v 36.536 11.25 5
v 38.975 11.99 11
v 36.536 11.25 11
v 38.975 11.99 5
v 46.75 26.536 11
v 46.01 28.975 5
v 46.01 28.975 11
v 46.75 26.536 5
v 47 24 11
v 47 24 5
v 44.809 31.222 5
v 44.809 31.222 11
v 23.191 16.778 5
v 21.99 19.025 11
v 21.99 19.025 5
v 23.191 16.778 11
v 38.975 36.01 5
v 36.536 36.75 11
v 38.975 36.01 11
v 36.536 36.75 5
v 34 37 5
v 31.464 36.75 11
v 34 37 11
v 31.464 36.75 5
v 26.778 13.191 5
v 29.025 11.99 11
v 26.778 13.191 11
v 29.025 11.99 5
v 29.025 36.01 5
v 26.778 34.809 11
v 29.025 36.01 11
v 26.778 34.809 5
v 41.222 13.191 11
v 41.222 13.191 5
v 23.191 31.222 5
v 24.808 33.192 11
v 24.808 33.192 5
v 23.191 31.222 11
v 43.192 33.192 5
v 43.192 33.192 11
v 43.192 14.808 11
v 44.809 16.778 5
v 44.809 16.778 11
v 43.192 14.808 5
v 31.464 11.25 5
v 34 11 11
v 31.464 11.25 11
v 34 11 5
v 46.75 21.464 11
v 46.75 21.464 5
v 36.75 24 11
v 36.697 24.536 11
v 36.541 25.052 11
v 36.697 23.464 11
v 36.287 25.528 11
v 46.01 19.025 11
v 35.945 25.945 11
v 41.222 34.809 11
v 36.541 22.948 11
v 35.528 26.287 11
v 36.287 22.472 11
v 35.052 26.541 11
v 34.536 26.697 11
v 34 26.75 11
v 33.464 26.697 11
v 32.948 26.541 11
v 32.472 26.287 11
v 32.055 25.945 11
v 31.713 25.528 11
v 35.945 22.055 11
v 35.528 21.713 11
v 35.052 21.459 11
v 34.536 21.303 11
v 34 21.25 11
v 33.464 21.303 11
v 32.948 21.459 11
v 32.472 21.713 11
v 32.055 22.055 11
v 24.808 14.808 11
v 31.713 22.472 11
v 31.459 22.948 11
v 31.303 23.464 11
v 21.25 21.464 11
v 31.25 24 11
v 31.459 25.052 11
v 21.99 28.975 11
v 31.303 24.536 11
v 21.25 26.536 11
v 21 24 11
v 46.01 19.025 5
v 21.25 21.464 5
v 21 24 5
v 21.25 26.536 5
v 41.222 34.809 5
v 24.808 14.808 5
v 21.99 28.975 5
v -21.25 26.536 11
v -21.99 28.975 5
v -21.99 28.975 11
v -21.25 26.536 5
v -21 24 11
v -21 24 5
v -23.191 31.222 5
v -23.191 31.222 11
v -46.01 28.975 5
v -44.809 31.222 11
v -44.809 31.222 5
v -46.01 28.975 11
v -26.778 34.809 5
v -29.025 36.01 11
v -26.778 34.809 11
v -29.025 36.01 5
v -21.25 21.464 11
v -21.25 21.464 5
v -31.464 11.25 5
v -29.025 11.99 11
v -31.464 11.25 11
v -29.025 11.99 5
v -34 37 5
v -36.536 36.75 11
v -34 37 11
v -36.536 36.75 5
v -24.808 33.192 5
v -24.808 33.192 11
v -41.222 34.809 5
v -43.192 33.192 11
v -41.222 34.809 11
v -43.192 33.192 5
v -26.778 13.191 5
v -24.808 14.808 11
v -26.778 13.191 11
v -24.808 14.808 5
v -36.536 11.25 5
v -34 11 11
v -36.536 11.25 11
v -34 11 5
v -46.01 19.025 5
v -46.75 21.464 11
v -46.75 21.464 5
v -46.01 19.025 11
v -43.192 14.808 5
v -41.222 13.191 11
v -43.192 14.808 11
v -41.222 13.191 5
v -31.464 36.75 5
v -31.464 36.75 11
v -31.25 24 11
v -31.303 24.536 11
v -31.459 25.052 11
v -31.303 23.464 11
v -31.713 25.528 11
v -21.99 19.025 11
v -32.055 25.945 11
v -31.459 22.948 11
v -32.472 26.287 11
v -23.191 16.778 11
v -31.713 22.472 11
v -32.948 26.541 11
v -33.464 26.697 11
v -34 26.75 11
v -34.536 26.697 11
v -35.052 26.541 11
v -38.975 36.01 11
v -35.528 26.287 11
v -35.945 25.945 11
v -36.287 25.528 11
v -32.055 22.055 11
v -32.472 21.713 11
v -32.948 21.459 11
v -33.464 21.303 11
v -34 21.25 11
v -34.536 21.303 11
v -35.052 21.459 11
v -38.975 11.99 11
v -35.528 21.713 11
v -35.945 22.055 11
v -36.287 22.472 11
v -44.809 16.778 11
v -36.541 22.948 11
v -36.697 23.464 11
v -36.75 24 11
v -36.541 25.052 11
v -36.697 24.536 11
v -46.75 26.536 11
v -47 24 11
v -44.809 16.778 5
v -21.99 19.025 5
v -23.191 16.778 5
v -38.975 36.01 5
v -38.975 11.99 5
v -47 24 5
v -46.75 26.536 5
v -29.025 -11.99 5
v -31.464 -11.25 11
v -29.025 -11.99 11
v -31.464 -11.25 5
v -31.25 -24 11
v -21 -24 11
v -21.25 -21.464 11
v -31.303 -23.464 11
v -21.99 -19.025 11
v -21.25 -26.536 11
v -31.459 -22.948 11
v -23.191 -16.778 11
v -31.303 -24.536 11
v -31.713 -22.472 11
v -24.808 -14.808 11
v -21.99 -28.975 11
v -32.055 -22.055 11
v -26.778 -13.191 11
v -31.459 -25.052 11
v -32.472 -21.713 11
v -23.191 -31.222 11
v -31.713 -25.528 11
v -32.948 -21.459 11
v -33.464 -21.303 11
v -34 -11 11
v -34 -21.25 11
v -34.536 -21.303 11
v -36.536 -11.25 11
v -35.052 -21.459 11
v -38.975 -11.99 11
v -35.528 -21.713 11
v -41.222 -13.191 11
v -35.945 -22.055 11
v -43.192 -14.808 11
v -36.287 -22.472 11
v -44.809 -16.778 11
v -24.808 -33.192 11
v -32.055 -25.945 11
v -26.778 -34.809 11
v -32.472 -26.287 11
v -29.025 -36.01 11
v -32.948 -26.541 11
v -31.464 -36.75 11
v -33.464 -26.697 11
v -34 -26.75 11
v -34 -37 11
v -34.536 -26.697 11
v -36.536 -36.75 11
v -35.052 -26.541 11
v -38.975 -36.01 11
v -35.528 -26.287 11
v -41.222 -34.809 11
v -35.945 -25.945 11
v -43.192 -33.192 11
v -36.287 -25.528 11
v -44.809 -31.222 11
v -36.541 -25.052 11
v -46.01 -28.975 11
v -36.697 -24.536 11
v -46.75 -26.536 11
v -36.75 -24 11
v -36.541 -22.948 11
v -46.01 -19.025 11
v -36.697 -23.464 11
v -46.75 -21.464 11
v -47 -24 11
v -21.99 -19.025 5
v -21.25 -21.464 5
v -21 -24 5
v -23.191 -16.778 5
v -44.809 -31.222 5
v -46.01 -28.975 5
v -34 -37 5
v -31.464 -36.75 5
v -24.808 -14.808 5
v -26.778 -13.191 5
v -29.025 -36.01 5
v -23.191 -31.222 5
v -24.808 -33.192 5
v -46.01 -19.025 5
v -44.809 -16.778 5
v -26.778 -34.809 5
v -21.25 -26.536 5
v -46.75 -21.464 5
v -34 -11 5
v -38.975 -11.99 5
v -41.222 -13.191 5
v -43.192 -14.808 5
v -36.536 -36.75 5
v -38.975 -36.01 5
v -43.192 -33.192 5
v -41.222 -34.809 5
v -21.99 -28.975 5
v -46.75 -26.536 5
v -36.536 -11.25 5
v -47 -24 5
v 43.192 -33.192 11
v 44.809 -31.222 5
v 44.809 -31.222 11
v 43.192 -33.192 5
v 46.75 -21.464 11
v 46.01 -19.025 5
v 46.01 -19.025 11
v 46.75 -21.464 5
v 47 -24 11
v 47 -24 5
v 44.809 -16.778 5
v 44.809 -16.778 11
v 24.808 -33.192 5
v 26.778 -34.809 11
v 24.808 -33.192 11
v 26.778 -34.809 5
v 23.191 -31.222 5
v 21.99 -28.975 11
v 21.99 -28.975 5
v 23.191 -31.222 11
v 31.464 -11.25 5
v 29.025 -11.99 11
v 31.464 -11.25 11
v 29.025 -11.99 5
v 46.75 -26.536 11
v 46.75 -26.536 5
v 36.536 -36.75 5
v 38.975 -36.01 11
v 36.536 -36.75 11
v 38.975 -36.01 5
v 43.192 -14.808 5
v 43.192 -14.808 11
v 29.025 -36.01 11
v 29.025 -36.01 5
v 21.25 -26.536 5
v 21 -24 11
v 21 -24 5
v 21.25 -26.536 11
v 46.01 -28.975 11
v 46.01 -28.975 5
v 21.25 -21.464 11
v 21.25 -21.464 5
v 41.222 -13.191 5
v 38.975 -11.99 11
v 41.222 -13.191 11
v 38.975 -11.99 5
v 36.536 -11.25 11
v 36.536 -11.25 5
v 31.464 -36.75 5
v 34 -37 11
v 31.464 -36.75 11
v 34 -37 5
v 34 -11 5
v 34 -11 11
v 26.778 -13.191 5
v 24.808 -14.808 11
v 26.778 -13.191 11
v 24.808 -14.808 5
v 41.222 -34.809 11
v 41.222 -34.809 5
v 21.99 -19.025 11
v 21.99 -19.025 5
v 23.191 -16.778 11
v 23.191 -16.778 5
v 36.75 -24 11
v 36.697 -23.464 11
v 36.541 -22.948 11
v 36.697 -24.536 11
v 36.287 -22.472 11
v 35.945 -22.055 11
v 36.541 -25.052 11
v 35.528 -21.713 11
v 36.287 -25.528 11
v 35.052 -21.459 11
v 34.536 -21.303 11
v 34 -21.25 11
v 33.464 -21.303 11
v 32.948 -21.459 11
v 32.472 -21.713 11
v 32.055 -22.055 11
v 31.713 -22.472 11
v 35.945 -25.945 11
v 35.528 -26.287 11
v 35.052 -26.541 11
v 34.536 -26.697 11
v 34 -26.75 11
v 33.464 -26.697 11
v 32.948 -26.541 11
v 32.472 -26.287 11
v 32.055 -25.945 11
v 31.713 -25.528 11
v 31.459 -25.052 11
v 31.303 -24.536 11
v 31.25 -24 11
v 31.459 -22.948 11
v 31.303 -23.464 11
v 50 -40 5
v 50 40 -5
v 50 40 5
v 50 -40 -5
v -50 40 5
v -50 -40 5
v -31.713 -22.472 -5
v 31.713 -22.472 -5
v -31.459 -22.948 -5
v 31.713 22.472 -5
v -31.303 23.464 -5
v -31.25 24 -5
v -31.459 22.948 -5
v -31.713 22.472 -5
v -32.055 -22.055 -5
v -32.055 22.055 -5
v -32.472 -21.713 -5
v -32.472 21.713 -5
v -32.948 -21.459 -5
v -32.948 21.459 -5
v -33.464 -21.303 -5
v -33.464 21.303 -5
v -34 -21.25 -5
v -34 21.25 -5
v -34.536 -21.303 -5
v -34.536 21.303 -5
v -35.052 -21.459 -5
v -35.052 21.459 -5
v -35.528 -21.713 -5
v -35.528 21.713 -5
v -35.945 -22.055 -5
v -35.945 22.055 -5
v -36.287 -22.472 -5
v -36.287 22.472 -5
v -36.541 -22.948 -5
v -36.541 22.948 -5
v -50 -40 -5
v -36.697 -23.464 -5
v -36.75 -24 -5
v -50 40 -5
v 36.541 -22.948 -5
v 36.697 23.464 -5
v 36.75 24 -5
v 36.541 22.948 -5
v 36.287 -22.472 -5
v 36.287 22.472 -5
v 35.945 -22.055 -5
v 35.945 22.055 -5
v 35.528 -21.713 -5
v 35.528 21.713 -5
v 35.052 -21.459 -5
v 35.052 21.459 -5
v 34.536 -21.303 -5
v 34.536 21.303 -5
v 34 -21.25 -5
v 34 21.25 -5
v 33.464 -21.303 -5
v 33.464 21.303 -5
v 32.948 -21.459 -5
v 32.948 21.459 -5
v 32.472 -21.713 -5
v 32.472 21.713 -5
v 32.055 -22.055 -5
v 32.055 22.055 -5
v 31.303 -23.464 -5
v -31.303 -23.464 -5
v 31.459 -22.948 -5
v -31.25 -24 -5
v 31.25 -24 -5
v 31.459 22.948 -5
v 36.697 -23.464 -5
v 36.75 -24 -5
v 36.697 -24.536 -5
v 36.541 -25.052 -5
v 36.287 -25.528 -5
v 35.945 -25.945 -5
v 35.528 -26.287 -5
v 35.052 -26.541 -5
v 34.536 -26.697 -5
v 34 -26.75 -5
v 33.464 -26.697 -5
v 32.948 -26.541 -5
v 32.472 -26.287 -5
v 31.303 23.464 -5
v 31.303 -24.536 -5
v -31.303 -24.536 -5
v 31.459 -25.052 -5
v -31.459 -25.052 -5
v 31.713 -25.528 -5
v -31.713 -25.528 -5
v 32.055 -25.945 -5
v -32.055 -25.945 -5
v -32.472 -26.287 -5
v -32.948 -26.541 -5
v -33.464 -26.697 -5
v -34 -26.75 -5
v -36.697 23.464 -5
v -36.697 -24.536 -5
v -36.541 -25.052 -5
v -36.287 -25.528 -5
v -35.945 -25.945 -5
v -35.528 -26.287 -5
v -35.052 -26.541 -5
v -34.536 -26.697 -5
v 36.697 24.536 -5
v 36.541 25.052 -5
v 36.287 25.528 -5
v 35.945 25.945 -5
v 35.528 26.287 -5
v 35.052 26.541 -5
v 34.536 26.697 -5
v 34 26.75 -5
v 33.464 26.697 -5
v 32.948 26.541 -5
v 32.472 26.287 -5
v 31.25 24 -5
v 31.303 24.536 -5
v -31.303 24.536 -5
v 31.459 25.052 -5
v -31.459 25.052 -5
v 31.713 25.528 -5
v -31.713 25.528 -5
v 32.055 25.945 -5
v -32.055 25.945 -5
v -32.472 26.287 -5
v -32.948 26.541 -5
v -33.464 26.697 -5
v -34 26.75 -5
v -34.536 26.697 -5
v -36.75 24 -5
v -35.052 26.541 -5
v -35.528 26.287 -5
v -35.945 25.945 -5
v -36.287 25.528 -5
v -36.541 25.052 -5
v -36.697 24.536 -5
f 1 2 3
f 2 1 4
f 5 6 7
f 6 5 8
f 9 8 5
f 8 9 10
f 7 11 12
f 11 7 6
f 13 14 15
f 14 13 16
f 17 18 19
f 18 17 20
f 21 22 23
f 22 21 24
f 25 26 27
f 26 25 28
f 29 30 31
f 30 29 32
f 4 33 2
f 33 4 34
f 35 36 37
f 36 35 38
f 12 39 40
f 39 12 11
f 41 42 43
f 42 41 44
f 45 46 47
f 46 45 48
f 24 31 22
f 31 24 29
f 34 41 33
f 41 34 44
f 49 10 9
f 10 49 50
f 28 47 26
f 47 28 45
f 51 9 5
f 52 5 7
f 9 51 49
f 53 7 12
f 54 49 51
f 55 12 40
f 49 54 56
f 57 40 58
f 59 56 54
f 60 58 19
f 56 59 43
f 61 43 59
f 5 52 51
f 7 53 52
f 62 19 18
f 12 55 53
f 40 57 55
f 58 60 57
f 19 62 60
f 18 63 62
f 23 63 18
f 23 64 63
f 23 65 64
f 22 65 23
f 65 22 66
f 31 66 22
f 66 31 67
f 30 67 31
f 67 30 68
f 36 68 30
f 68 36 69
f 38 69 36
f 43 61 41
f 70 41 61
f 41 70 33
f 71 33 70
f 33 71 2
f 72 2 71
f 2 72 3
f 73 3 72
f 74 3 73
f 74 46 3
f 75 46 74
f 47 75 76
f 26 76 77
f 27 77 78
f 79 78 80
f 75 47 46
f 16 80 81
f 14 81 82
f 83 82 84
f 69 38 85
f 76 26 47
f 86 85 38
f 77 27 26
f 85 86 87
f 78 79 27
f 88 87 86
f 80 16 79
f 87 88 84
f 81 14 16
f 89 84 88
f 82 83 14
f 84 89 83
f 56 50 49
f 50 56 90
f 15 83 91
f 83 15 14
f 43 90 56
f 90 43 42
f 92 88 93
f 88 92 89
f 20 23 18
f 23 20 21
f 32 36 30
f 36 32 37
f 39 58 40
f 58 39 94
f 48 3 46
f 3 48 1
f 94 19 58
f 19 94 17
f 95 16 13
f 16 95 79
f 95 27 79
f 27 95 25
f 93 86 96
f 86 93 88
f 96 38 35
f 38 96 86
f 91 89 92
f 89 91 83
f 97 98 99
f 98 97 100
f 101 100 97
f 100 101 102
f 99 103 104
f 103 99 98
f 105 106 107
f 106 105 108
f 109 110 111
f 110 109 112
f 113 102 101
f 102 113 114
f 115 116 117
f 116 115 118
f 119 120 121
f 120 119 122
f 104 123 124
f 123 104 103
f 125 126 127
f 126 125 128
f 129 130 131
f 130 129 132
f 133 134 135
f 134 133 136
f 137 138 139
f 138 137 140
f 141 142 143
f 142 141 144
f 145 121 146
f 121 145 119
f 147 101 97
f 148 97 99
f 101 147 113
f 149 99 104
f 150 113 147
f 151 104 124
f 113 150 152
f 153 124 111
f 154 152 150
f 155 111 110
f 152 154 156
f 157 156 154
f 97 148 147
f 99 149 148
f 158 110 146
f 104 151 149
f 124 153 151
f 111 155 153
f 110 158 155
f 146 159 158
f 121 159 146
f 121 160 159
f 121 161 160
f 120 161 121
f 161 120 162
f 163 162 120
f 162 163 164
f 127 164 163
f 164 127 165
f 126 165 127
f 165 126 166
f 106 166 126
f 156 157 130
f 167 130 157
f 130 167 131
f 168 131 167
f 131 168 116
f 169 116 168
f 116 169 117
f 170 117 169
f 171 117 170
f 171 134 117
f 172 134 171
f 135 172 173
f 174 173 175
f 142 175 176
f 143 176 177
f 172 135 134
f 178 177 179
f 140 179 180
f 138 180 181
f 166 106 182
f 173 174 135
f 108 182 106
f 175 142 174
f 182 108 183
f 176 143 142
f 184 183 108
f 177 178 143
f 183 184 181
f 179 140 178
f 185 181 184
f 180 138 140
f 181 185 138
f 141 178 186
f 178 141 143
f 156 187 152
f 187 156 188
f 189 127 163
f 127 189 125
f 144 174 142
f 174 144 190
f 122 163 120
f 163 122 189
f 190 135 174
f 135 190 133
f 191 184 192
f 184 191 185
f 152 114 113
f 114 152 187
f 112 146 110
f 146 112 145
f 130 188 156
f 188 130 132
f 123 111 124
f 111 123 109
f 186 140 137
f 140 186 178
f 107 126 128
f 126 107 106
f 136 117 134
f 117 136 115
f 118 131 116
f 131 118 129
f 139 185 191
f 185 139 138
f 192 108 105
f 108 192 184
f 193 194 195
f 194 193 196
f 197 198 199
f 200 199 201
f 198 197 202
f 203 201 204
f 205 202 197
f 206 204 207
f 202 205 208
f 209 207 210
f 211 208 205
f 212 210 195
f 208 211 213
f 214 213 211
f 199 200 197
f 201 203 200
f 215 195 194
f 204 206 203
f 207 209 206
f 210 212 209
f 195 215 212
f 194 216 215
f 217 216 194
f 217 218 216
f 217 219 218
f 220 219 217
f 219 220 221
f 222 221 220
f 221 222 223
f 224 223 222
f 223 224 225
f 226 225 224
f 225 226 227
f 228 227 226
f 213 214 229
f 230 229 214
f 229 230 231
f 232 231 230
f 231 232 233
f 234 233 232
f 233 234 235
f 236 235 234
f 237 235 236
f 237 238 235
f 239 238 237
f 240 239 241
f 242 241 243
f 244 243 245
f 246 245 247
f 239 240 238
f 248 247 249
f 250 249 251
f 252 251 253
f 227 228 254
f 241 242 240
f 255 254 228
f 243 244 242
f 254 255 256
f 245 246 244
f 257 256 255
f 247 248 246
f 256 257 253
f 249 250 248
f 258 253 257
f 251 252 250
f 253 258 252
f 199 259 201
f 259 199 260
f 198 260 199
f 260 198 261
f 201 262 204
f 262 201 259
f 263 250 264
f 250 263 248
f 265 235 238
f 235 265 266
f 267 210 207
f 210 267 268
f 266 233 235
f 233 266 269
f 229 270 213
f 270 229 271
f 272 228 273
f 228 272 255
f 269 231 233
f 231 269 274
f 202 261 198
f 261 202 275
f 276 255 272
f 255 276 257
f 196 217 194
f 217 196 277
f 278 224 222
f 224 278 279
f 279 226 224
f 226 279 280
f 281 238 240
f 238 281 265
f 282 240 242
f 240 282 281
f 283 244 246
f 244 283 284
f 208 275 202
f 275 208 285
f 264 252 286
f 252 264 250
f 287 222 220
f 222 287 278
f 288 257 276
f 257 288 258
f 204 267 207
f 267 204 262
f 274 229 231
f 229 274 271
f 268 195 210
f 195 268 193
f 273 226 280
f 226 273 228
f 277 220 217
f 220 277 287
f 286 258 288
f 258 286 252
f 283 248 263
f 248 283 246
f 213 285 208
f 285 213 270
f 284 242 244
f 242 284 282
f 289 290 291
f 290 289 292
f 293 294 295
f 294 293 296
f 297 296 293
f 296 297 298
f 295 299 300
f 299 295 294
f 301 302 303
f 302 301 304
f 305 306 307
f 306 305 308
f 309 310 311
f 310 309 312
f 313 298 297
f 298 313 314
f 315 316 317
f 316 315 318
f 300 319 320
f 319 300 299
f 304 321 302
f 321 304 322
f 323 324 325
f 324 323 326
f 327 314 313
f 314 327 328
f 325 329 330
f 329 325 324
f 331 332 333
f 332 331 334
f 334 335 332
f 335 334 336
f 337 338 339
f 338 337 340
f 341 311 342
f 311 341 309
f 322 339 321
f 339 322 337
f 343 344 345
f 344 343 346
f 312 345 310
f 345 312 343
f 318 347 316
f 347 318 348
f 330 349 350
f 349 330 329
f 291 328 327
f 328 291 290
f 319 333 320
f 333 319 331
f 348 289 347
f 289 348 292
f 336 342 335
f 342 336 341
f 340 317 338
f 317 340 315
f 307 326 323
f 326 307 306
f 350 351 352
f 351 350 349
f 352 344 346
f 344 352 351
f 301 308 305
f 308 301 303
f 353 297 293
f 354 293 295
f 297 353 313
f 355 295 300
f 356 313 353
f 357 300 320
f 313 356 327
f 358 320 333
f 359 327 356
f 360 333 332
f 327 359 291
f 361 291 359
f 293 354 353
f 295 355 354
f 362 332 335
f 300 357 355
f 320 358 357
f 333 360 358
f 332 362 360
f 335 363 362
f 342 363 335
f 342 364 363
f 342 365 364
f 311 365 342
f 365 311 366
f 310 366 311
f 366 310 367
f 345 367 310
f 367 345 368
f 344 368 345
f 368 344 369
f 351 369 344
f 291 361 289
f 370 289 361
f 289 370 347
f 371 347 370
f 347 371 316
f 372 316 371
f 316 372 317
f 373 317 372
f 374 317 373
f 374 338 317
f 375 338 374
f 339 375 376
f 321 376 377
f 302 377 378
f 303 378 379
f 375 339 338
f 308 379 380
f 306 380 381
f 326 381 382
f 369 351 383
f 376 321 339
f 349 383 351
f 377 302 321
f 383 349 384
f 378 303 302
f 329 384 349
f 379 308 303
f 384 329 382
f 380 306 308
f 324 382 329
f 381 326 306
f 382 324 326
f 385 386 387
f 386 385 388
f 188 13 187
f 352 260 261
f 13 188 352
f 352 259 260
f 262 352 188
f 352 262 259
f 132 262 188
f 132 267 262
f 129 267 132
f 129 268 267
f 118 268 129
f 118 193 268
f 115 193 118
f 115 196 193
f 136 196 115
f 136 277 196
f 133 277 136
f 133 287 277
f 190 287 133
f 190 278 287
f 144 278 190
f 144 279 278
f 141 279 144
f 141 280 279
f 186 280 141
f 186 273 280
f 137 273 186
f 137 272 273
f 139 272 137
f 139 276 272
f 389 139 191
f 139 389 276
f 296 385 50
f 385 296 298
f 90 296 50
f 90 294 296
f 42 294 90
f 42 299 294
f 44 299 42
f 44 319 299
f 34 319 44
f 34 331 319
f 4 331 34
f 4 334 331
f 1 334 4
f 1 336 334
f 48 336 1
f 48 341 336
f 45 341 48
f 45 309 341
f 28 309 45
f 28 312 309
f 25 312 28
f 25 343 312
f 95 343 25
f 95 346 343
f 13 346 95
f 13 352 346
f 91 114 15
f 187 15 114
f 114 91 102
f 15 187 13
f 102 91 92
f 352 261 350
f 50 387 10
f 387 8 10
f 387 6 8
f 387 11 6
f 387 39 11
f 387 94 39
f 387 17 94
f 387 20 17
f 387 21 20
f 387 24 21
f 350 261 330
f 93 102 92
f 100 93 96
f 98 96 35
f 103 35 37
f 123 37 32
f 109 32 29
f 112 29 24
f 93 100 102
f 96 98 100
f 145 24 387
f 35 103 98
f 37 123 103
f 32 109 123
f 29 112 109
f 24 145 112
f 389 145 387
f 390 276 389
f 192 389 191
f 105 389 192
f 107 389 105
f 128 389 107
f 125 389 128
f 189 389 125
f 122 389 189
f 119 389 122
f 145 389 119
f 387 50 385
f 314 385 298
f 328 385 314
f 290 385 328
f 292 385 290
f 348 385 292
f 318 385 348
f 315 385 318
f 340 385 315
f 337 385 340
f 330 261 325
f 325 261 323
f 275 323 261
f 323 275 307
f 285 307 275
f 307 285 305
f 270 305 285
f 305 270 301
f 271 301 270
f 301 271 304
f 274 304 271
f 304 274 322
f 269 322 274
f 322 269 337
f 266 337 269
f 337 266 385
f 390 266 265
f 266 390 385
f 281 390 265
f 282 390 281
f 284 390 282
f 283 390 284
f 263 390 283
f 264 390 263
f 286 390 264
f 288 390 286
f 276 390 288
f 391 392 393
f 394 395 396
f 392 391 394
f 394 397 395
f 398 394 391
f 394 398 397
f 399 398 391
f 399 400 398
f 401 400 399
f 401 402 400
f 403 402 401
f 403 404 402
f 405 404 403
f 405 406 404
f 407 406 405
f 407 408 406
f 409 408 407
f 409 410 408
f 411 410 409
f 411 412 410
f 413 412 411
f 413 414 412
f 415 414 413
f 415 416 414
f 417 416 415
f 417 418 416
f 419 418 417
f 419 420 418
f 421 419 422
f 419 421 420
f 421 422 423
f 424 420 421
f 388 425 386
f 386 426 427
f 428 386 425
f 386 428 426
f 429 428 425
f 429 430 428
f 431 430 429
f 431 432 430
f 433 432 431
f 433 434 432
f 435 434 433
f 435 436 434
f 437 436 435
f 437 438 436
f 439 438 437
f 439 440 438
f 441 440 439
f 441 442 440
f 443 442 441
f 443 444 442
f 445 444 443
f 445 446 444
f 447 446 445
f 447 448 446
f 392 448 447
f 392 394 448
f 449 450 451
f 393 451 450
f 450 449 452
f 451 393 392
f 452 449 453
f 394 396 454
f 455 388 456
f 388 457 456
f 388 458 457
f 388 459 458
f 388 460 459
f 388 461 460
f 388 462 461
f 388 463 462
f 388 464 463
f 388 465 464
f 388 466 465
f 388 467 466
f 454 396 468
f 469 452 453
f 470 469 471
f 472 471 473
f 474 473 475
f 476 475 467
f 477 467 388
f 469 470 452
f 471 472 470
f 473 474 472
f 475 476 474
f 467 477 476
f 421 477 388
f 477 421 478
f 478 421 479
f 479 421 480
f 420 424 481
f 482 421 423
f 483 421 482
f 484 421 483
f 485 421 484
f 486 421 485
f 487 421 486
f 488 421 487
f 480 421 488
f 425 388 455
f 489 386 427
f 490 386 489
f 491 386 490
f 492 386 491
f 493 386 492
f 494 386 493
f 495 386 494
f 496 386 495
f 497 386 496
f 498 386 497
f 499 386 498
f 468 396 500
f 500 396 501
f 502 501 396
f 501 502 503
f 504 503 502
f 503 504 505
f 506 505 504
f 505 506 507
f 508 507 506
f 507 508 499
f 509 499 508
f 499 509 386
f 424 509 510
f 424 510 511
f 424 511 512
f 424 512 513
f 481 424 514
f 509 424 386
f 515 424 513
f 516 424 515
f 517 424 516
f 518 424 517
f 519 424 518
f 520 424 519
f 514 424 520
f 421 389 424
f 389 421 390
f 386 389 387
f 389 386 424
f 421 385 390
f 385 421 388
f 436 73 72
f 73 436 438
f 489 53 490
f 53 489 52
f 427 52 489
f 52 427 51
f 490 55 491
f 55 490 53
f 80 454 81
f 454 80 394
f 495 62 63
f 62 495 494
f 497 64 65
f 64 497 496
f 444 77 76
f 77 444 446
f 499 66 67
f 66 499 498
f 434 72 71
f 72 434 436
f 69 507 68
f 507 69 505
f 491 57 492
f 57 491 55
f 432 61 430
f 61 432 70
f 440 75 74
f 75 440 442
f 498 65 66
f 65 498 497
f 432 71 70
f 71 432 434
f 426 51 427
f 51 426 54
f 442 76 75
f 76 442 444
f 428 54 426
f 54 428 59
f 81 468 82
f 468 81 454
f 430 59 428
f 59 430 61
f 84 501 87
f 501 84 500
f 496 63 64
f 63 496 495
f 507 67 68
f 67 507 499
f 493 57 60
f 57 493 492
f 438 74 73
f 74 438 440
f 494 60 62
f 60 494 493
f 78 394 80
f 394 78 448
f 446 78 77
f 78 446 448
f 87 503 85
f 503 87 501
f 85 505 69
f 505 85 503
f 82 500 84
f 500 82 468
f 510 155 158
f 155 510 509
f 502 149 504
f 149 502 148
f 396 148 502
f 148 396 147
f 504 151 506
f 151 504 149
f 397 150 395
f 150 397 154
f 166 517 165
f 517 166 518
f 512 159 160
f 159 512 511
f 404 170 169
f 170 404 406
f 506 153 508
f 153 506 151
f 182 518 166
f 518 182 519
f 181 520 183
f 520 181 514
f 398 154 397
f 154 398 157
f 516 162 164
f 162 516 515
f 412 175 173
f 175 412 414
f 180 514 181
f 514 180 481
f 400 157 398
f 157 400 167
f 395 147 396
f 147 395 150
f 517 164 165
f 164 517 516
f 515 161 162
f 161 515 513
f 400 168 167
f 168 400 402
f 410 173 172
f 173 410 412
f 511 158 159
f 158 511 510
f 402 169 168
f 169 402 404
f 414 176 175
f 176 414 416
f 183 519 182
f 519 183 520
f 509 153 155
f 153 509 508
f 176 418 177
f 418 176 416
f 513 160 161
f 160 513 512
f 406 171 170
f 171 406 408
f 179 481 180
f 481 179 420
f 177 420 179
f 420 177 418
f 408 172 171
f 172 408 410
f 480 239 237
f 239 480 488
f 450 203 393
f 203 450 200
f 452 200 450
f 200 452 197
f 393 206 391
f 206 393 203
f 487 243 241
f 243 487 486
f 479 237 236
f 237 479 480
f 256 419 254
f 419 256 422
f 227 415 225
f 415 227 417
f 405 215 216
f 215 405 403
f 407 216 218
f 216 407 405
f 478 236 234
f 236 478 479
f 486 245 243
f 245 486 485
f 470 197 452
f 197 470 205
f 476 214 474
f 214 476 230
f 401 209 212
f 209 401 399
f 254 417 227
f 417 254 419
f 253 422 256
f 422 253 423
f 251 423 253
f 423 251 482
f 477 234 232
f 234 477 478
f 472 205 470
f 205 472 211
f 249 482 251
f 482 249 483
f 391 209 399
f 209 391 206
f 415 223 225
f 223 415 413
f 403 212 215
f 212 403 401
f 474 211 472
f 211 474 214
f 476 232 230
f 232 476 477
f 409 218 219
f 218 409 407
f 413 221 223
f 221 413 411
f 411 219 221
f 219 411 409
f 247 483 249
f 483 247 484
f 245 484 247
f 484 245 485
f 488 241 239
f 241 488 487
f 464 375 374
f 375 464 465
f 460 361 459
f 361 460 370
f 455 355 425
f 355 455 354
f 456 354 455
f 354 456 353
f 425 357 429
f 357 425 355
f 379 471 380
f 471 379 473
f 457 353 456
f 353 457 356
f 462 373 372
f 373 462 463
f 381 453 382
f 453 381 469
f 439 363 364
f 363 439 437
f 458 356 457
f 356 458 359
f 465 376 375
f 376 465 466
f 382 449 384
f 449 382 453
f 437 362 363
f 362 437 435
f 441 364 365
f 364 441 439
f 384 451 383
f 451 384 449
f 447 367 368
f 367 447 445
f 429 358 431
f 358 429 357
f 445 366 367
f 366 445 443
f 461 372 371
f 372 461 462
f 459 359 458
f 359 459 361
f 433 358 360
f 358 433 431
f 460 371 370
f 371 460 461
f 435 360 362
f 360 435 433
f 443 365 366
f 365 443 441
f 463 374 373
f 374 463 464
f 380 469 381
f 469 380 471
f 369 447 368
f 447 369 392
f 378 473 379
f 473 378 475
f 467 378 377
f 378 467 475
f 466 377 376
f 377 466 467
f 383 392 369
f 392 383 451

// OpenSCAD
$fn = 32;

// ----------------------------------------------------------------------
// Anchor pads 100 x 80 x 16
// four corner bosses with anchor holes
// ----------------------------------------------------------------------

// --- parameters (mm) ---
plate = [100, 80, 10];  // base plate size (x, y, z)
seat_tol = 0.15;        // tolerance at the seating features
free_tol = 0.5;         // general tolerance on the free sizes
pads = 4;               // boss count, one per corner
edge = 16;              // boss centre offset from the plate edge
boss_d = 26;            // boss diameter
boss_h = 6;             // boss height above the base plate
hole_d = 5.5;           // hole diameter

// --- derived feature positions (mm) ---
height = plate[2] + boss_h;      // = 16   overall height of the part
corner_x = plate[0] / 2 - edge;  // = 34   boss centre X
corner_y = plate[1] / 2 - edge;  // = 24   boss centre Y
feature_centers = [
  [corner_x, corner_y],
  [-corner_x, corner_y],
  [-corner_x, -corner_y],
  [corner_x, -corner_y]
];   // boss centres, anchor holes are drilled there

// base plate, four bosses standing on it, anchor holes all the way through
difference() {
  union() {
    cube(plate, center = true);
    for (centre = feature_centers)
      translate([centre[0], centre[1], plate[2] / 2 - 1])
        cylinder(d = boss_d, h = boss_h + 1);
  }
  for (centre = feature_centers)
    translate([centre[0], centre[1], -height])
      cylinder(d = hole_d, h = 2 * height + 2);  // through boss and plate
}
